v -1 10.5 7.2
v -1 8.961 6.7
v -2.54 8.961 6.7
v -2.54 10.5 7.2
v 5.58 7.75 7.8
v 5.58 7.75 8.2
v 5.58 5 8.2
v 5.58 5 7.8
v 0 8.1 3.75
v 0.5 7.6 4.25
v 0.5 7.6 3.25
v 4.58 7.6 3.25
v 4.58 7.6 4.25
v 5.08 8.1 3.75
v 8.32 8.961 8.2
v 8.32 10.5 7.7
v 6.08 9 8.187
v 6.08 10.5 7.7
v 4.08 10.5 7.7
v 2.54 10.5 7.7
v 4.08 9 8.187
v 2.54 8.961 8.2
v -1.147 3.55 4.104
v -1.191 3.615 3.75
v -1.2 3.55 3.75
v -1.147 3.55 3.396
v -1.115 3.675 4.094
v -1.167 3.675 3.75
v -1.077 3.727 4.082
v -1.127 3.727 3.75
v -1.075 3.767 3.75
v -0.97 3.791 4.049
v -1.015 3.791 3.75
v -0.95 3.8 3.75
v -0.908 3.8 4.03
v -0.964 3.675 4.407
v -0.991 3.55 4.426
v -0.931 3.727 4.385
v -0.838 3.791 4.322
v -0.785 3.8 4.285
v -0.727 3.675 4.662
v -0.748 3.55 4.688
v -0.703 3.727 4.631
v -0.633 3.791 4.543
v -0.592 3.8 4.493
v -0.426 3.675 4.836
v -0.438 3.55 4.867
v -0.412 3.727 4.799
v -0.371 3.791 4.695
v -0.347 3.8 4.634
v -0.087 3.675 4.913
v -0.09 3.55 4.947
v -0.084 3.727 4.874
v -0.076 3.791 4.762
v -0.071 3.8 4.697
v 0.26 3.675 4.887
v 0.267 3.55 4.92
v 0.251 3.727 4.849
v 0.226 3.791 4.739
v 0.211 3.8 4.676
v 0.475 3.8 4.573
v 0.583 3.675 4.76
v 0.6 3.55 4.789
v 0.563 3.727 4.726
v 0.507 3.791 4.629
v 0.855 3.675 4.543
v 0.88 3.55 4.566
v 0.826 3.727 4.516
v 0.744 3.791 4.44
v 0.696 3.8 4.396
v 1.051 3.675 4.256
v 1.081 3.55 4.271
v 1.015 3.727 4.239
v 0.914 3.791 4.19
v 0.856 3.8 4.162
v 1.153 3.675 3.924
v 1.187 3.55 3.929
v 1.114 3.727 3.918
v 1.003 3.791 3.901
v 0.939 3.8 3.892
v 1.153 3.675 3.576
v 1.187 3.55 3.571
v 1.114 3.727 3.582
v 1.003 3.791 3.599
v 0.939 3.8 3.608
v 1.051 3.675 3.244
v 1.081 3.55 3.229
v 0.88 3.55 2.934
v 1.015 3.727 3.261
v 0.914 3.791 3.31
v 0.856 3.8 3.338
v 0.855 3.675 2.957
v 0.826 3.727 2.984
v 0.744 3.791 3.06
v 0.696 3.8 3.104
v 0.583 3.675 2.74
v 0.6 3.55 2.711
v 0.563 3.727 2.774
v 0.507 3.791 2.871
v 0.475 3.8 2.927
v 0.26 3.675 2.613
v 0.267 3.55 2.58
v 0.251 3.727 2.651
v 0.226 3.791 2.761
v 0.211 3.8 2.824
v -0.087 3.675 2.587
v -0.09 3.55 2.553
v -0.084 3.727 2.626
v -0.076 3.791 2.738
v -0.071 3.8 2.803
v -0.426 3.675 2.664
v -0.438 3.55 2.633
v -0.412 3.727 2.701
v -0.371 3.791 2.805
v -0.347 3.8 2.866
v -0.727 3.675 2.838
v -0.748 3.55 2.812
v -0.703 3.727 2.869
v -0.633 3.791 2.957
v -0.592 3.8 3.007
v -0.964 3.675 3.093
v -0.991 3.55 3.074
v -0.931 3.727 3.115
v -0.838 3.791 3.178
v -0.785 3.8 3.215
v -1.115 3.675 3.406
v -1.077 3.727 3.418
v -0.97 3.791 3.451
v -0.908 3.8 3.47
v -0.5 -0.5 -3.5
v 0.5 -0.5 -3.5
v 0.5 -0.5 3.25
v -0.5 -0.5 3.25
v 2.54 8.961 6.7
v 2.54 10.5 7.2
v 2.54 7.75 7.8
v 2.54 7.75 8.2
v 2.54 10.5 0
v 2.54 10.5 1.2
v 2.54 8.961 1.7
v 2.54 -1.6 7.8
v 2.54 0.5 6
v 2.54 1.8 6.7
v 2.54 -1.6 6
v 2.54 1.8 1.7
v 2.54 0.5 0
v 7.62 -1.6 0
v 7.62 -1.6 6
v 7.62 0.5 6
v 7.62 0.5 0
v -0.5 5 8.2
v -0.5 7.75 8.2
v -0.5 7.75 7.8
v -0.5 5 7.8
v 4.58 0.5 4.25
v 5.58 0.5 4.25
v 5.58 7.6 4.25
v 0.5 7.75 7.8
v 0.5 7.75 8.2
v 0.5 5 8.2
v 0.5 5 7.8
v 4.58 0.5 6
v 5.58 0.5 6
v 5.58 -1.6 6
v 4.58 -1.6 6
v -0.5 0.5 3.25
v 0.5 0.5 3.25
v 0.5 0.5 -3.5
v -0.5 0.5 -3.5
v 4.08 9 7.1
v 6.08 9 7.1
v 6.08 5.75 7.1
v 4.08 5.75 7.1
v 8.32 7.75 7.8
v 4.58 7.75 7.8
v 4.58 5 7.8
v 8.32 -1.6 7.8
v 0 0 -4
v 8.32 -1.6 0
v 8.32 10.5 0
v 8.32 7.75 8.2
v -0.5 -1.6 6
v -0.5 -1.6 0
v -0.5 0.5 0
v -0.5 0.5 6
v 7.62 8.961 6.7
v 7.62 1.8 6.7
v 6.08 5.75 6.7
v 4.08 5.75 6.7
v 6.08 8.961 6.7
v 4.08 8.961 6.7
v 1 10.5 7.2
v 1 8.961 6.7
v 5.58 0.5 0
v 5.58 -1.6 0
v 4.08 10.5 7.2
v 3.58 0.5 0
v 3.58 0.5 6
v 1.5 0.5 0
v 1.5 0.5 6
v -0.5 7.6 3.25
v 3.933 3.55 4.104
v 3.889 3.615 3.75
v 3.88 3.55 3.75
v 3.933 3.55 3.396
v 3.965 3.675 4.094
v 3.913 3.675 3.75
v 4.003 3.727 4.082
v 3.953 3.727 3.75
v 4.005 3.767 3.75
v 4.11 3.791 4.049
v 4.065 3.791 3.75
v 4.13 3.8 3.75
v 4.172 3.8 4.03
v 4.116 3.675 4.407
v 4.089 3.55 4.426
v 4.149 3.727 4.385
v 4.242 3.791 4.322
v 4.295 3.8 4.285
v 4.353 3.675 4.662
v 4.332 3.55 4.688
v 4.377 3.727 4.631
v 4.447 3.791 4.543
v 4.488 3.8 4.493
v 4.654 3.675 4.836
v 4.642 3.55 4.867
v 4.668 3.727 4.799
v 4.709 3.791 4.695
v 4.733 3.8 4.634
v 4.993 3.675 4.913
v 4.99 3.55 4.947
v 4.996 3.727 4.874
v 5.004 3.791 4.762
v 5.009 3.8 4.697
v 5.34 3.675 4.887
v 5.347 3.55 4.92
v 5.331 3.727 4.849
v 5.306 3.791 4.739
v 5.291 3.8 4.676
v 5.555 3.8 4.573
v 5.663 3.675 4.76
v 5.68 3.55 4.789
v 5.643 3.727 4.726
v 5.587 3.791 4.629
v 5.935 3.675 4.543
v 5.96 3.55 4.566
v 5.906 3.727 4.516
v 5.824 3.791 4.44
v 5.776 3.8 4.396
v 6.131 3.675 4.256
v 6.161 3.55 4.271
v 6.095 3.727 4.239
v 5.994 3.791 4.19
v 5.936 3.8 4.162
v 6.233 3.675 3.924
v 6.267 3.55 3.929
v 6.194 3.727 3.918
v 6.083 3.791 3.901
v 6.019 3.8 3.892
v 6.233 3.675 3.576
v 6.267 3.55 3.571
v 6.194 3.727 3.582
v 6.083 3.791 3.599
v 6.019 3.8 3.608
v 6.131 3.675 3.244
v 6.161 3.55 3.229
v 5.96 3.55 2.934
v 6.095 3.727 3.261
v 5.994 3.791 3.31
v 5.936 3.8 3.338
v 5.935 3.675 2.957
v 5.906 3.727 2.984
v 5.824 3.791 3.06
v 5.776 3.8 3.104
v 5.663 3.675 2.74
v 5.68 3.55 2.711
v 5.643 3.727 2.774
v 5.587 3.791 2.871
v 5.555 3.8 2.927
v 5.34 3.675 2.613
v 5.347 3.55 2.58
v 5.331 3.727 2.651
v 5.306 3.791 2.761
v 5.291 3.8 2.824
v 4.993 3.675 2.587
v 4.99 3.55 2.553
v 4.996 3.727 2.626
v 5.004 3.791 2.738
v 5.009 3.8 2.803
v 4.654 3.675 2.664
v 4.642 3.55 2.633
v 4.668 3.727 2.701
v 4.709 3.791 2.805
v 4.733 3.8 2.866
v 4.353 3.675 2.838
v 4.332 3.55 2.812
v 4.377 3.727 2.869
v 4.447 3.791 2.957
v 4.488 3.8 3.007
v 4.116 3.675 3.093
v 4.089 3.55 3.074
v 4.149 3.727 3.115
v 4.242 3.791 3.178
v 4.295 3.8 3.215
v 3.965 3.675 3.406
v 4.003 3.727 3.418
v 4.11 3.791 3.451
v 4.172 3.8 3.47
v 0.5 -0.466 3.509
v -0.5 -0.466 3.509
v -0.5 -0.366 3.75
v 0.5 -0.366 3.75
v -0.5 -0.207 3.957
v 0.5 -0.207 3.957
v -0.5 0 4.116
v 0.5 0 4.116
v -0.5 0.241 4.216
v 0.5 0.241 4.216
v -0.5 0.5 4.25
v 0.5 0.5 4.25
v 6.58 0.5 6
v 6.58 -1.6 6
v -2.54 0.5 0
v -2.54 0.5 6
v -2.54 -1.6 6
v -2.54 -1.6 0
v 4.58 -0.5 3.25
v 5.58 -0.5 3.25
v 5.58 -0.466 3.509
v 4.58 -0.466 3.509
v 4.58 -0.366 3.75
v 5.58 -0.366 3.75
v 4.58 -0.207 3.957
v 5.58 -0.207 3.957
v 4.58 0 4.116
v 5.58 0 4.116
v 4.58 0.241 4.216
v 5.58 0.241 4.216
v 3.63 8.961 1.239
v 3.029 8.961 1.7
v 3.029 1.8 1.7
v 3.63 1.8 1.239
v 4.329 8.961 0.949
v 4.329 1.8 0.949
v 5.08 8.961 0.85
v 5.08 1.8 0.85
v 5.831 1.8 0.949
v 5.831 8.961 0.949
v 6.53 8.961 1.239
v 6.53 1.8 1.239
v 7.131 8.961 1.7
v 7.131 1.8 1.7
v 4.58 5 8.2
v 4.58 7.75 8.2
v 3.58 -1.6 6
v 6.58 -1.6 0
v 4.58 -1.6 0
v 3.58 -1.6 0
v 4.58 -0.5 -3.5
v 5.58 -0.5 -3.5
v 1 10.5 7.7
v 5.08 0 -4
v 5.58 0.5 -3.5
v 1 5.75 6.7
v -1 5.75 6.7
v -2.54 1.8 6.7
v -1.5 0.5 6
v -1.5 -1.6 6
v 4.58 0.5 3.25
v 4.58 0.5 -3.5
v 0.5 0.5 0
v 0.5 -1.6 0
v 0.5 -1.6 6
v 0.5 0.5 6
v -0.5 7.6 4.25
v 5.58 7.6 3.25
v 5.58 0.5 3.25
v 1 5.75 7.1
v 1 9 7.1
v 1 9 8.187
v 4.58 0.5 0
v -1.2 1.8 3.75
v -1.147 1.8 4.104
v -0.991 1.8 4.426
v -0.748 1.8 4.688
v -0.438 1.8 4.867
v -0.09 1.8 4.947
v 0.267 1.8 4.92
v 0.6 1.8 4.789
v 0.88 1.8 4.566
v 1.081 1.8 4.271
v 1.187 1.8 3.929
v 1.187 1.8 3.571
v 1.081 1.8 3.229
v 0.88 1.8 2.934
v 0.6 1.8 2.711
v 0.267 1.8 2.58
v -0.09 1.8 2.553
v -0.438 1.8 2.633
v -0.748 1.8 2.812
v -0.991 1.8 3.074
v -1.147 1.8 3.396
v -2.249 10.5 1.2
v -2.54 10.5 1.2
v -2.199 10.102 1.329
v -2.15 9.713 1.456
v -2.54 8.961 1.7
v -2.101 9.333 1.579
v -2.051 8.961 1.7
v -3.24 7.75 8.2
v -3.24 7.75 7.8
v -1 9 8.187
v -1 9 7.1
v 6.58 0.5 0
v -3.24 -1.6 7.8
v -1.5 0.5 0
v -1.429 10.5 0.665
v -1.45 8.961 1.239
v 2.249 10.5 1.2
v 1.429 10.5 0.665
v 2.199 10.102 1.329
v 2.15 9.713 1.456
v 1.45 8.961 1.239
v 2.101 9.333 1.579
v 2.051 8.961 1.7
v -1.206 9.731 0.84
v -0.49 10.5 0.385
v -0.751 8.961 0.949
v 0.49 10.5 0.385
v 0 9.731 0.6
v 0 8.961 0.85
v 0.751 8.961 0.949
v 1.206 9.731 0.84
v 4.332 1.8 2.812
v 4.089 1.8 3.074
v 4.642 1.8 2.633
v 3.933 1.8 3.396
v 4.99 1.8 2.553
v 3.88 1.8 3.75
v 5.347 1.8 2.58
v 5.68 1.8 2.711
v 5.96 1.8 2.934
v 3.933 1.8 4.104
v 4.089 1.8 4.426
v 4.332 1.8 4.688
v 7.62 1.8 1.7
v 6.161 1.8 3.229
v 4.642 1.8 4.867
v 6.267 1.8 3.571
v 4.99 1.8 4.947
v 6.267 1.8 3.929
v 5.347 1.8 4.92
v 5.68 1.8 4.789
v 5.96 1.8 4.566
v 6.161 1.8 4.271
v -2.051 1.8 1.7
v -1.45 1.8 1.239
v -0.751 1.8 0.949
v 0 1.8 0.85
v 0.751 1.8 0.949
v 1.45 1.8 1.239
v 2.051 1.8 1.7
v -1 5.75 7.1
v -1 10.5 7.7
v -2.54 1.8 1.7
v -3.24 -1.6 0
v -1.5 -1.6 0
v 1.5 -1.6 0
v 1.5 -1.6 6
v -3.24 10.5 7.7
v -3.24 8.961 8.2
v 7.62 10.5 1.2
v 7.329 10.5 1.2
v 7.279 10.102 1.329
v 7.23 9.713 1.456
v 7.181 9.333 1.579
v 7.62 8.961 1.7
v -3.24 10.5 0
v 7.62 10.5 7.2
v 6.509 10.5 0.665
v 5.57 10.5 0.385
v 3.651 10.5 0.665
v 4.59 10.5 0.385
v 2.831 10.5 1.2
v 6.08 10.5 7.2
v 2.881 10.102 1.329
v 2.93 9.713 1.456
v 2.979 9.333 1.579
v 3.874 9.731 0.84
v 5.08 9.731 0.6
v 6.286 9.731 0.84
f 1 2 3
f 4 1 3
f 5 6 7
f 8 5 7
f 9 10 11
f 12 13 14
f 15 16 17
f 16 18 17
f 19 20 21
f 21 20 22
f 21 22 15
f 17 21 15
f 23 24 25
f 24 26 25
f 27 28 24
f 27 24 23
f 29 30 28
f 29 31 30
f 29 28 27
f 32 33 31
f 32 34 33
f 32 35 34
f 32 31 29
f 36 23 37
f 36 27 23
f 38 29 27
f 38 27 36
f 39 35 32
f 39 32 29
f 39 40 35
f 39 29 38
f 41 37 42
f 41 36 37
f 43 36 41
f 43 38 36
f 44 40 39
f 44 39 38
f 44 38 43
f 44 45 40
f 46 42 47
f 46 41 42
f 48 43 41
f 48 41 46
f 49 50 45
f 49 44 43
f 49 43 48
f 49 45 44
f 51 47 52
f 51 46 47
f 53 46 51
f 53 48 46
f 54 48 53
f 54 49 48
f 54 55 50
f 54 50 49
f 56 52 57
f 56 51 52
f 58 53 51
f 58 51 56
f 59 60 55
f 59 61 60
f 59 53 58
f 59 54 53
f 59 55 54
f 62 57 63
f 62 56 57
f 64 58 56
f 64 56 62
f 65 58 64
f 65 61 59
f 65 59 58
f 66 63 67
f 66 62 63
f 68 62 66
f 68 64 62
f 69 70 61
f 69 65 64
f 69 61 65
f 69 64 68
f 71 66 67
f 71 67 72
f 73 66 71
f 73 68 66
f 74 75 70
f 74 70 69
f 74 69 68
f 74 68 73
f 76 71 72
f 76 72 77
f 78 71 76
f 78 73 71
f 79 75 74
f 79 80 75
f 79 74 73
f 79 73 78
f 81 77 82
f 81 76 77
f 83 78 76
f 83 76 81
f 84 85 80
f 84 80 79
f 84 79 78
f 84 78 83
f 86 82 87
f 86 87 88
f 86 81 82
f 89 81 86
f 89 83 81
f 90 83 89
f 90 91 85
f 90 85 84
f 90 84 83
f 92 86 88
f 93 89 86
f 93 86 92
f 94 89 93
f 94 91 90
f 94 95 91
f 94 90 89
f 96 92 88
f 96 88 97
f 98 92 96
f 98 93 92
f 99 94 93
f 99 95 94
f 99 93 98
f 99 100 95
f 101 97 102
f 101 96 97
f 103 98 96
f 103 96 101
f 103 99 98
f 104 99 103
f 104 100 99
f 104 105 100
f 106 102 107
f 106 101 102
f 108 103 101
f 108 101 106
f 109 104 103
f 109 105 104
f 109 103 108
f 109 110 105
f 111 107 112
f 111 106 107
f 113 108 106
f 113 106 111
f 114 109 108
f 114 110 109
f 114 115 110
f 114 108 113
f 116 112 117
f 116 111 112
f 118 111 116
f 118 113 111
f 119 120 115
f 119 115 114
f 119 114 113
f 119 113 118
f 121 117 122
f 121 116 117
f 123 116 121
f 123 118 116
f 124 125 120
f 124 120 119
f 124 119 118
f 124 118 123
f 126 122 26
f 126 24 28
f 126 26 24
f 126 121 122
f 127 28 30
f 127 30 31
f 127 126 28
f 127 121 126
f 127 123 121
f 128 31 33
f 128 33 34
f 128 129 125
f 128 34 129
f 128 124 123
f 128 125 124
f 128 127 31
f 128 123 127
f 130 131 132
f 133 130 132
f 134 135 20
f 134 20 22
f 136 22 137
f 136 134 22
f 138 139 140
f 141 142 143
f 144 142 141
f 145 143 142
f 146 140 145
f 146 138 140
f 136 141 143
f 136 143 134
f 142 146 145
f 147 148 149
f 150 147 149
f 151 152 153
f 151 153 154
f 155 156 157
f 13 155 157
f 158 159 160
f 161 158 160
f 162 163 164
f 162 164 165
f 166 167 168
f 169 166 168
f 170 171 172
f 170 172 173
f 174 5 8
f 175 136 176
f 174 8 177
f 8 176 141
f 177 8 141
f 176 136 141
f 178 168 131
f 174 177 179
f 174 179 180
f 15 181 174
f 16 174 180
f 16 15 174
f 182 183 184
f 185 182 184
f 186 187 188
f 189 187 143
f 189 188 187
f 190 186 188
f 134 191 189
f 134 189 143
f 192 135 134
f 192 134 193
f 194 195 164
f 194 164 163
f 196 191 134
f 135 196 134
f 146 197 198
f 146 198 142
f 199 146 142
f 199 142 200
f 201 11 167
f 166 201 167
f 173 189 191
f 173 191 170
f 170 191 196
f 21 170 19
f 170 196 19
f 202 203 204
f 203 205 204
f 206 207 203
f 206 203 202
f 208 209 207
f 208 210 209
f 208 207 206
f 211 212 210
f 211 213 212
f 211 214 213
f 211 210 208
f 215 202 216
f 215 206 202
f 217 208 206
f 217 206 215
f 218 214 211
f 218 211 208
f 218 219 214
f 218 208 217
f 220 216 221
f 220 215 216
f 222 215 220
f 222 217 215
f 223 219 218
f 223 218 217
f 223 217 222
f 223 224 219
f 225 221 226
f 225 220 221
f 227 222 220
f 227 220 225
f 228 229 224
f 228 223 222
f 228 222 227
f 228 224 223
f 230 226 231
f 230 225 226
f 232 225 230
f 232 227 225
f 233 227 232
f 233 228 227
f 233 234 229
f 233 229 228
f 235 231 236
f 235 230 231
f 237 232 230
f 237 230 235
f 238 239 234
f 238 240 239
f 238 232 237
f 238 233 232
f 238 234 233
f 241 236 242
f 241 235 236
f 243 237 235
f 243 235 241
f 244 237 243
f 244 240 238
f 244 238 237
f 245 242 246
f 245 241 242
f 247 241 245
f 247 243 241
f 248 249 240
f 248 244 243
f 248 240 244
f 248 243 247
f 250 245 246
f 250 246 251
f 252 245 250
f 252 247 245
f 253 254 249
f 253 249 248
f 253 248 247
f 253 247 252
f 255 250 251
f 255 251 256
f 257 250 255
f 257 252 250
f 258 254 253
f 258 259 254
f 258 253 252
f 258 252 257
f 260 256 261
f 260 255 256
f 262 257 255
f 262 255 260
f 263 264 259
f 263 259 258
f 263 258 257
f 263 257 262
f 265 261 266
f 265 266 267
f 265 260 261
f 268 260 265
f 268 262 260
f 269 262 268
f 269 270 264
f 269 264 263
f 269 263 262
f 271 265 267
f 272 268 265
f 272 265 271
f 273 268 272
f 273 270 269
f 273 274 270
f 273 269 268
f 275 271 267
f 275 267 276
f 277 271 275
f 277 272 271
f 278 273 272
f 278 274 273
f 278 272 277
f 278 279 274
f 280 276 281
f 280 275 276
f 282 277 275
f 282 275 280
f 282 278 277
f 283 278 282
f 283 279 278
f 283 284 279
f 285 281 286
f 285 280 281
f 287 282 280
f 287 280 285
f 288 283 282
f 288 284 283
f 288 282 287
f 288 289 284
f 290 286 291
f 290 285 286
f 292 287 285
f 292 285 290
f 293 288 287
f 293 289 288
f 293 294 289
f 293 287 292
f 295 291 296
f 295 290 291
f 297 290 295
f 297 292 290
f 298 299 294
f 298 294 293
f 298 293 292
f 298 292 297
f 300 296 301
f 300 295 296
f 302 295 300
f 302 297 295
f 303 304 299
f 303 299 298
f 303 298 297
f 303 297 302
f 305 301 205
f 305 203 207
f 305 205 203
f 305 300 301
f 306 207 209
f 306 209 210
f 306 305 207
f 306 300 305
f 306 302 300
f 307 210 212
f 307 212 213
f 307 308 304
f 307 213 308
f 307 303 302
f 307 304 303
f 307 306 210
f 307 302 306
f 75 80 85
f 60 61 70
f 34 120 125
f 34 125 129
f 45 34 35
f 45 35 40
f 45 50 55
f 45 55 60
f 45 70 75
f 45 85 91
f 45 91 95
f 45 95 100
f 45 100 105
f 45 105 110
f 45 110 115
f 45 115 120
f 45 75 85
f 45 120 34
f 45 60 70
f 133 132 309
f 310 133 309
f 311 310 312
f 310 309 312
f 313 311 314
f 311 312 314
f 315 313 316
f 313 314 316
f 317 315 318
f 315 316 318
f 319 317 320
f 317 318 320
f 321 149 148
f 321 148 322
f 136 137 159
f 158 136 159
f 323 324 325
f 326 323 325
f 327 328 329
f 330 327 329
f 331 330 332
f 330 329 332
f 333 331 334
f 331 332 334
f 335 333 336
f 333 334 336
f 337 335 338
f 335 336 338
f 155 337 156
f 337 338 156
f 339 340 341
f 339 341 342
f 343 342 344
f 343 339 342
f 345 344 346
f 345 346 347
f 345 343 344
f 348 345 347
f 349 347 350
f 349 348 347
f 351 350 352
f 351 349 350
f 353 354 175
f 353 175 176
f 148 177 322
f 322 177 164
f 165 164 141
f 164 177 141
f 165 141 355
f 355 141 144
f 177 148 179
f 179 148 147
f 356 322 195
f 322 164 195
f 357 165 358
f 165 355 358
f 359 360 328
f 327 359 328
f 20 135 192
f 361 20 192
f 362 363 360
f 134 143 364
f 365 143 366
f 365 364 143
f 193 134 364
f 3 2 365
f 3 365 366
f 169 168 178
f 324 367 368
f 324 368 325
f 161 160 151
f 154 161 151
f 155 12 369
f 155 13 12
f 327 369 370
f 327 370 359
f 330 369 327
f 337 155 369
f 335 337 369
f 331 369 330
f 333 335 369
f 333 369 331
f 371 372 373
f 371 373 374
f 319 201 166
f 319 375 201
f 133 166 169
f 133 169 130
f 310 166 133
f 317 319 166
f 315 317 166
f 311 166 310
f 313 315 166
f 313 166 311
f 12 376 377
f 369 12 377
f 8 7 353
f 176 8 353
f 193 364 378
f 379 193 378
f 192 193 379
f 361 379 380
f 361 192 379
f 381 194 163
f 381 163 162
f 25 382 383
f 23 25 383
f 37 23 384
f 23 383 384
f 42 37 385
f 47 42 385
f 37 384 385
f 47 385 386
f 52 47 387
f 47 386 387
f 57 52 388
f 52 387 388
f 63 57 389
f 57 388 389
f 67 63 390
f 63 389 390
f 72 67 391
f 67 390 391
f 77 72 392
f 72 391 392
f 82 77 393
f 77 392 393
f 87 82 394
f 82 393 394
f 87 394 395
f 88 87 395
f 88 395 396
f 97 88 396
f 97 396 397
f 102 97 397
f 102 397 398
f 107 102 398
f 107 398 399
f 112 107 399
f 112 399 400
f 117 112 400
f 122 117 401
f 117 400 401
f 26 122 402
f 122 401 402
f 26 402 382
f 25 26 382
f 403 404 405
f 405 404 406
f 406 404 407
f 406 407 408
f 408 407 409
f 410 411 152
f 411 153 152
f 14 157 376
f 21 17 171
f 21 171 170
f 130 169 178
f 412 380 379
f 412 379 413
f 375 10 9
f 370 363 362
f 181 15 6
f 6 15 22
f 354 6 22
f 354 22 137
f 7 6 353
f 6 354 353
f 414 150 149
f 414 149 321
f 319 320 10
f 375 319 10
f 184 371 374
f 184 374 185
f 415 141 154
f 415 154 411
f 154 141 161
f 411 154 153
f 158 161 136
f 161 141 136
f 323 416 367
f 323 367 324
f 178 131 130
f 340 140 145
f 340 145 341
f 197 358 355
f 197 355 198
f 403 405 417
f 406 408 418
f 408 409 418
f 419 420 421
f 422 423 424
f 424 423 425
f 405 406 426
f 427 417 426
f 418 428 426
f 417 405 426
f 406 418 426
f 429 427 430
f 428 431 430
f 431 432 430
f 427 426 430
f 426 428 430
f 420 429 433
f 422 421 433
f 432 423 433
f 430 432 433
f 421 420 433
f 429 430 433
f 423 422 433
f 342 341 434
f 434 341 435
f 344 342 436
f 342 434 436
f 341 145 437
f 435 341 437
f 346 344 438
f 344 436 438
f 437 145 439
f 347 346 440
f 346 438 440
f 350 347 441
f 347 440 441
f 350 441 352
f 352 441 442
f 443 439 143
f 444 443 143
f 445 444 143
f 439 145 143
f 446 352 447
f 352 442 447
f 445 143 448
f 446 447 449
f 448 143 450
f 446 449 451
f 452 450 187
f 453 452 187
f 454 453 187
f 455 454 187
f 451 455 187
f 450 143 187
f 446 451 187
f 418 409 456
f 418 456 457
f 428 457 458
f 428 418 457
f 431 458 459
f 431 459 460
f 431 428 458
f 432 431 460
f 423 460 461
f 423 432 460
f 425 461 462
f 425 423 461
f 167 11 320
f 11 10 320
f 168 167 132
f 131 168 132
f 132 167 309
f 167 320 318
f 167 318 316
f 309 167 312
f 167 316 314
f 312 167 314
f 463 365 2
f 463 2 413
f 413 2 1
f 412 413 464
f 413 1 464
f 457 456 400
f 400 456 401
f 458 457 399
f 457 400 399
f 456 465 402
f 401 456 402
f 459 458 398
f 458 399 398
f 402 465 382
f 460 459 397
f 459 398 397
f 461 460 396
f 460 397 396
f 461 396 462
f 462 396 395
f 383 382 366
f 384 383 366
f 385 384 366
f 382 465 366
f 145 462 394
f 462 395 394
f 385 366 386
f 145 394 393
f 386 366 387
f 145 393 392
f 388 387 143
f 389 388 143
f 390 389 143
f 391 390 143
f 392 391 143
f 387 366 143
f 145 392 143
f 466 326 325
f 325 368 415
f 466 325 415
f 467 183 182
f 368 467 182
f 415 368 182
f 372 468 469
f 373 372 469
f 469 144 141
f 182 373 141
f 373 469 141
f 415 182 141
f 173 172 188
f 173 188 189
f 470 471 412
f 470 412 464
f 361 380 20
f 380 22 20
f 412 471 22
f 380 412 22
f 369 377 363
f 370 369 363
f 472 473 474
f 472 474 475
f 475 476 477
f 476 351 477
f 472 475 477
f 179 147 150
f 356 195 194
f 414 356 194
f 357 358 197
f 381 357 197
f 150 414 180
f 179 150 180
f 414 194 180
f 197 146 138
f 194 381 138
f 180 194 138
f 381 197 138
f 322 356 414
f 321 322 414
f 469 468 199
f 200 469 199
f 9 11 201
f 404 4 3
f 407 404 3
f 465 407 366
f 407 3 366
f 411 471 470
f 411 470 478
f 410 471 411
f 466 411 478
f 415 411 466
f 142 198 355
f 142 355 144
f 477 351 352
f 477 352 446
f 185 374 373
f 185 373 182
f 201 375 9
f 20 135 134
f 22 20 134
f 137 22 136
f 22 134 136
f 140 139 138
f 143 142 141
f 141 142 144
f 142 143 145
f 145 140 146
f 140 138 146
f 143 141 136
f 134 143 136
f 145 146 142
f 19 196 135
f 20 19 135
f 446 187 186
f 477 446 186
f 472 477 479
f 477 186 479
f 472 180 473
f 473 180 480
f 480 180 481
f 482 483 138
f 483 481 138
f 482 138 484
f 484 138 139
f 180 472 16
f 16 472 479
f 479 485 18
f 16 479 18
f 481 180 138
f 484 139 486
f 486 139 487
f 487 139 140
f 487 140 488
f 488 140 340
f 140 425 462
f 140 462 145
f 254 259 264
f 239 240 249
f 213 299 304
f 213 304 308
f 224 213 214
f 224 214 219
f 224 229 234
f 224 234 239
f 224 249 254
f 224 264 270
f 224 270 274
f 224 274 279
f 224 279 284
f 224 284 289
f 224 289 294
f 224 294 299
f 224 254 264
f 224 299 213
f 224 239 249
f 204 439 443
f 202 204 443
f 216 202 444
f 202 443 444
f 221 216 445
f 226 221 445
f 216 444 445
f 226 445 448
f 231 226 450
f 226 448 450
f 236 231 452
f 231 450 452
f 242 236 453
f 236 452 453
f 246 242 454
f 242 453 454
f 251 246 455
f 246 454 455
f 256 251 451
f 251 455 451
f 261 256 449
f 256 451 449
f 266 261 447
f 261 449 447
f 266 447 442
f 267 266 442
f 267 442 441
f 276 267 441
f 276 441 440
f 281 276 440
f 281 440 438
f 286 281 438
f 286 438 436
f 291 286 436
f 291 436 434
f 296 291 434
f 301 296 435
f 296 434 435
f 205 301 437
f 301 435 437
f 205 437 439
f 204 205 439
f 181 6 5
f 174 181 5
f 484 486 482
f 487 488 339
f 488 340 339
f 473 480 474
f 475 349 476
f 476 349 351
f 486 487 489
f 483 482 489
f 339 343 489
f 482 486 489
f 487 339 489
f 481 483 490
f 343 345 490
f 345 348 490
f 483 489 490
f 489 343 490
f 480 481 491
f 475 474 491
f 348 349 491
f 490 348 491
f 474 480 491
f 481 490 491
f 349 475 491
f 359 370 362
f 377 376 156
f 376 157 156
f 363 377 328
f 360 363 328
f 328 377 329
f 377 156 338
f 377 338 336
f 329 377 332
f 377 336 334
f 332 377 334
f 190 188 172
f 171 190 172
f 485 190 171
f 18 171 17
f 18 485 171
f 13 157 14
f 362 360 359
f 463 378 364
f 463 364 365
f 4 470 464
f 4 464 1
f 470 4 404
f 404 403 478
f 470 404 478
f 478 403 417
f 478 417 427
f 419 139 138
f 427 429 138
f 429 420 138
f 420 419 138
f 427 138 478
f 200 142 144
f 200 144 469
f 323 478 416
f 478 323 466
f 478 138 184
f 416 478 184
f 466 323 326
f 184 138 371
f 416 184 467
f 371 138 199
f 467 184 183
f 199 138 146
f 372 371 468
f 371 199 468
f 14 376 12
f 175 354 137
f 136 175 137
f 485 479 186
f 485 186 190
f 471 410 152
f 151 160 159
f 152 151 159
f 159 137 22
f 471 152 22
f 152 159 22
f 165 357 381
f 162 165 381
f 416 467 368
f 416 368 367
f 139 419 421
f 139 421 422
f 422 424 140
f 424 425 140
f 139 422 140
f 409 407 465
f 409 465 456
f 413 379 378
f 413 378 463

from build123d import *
from OCP.BRepFilletAPI import BRepFilletAPI_MakeChamfer

# Parameters (mm, degrees)
SKETCH_1_W             = 5.08
SKETCH_1_H             = 12.1
EXTRUDE_1_DEPTH        = 8.2
CUT_EXTRUDE_1_DEPTH    = 8.7
SKETCH_3_R             = 1.2
EXTRUDE_2_DEPTH        = 2
FILLET_1_R             = 0.25
CHAMFER_1_SIZE         = 0.5
CHAMFER_1_SIZE2        = 1.538841769
SKETCH_4_W             = 2
SKETCH_4_H             = 1.010953213
CUT_EXTRUDE_2_DEPTH    = 4.75
SKETCH_5_W             = 2
SKETCH_5_H             = 1.705458635
CUT_EXTRUDE_3_DEPTH    = 1.5
CHAMFER_2_SIZE         = 0.5
CHAMFER_2_SIZE2        = 1.538841769
SKETCH_6_W             = 5.08
SKETCH_6_H             = 6.6
CUT_EXTRUDE_4_DEPTH    = 0.4
SKETCH_7_W             = 2.04
SKETCH_7_H             = 2.75
CUT_EXTRUDE_5_DEPTH    = 0.4
EXTRUDE_1_2_DEPTH      = 0.5
EXTRUDE_1_2_DEPTH_BACK = 0.5
CHAMFER_3_SIZE         = 0.5
SKETCH_9_W             = 1
SKETCH_9_H             = 2.1
SKETCH_9_W_2           = 1.04
CUT_EXTRUDE_6_DEPTH    = 6
PATTERN_LINEAR_1_COUNT = 2
PATTERN_LINEAR_1_PITCH = 5.08
EXTRUDE_3_DEPTH        = 0.7
EXTRUDE_4_DEPTH        = 0.7
MOVE_BODY_1_ANGLE      = 180


with BuildPart() as part:
    # Эскиз1 → Extrude 1 (new body)
    with BuildSketch(Plane(origin=(0, 0, 0), x_dir=(1, 0, 0), z_dir=(0, 1, 0))):
        Rectangle(SKETCH_1_W, SKETCH_1_H)
    extrude(amount=EXTRUDE_1_DEPTH)

    # Эскиз2 → Вырез-Вытянуть1 (cut)
    with BuildSketch(Plane.XY.offset(6.05)):
        with BuildLine():
            Line((-2.54, 6.7), (2.54, 6.7))
            Line((2.54, 6.7), (2.54, 1.7))
            Line((2.54, 1.7), (2.05121915, 1.7))
            ThreePointArc((2.05121915, 1.7), (0, 0.85), (-2.05121915, 1.7))
            Line((-2.05121915, 1.7), (-2.54, 1.7))
            Line((-2.54, 1.7), (-2.54, 6.7))
        make_face()
    extrude(amount=-CUT_EXTRUDE_1_DEPTH, mode=Mode.SUBTRACT)

    # Эскиз3 → Бобышка-Вытянуть2 (add)
    with BuildSketch(Plane.XY.offset(-2.65)):
        with Locations((0, 3.75)):
            Circle(SKETCH_3_R)
    extrude(amount=EXTRUDE_2_DEPTH)

    # Скругление1
    fillet_1_edges = [part.edges().sort_by_distance(p)[0] for p in [
        (-1.2, 3.75, -0.65),
    ]]
    fillet(fillet_1_edges, radius=FILLET_1_R)

    # Фаска1: one chamfer whose edges measure the first distance from different faces: ONE call of the kernel's chamfer builder (chamfer() names one face for all edges)
    chamfer_1_edges_1 = [part.edges().sort_by_distance(p)[0] for p in [
        (0, 6.7, 6.05),
    ]]
    chamfer_1_side_1 = [part.faces().sort_by_distance(p)[0] for p in [
        (0, 7.45, 6.05),
    ]]
    chamfer_1_edges_2 = [part.edges().sort_by_distance(p)[0] for p in [
        (2.295609575, 1.7, 6.05),
        (-2.295609575, 1.7, 6.05),
        (0, 0.85, 6.05),
    ]]
    chamfer_1_side_2 = [part.faces().sort_by_distance(p)[0] for p in [
        (0, 0.655214235, 6.05),
    ]]
    chamfer_1 = BRepFilletAPI_MakeChamfer(part.part.solid().wrapped)
    for e in chamfer_1_edges_1:
        chamfer_1.Add(CHAMFER_1_SIZE, CHAMFER_1_SIZE2, e.wrapped, chamfer_1_side_1[0].wrapped)  # the first distance lies on this face
    for e in chamfer_1_edges_2:
        chamfer_1.Add(CHAMFER_1_SIZE, CHAMFER_1_SIZE2, e.wrapped, chamfer_1_side_2[0].wrapped)  # the first distance lies on this face
    add(Compound.cast(chamfer_1.Shape()), mode=Mode.REPLACE)

    # Эскиз4 → Вырез-Вытянуть2 (cut)
    with BuildSketch(Plane.XY.offset(6.05)):
        with Locations((0, 6.594523394)):
            Rectangle(SKETCH_4_W, SKETCH_4_H)
    extrude(amount=-CUT_EXTRUDE_2_DEPTH, mode=Mode.SUBTRACT)

    # Эскиз5 → Вырез-Вытянуть3 (cut)
    with BuildSketch(Plane.XY.offset(6.05)):
        with Locations((0, 7.552729318)):
            Rectangle(SKETCH_5_W, SKETCH_5_H)
    extrude(amount=-CUT_EXTRUDE_3_DEPTH, mode=Mode.SUBTRACT)

    # Фаска2
    chamfer_2_edges = [part.edges().sort_by_distance(p)[0] for p in [
        (-1.77, 8.2, 6.05),
    ]]
    chamfer_2_side = [part.faces().sort_by_distance(p)[0] for p in [
        (-1.77, 7.7, 6.05),
    ]]
    chamfer(chamfer_2_edges, length=CHAMFER_2_SIZE, length2=CHAMFER_2_SIZE2, reference=chamfer_2_side[0])

    # Эскиз6 → Вырез-Вытянуть4 (cut)
    with BuildSketch(Plane(origin=(0, 8.2, 0), x_dir=(1, 0, 0), z_dir=(0, 1, 0))):
        with Locations((0, 2.75)):
            Rectangle(SKETCH_6_W, SKETCH_6_H)
    extrude(amount=-CUT_EXTRUDE_4_DEPTH, mode=Mode.SUBTRACT)

    # Эскиз7 → Вырез-Вытянуть5 (cut)
    with BuildSketch(Plane(origin=(0, 8.2, 0), x_dir=(1, 0, 0), z_dir=(0, 1, 0))):
        with Locations((1.52, -1.925)):
            Rectangle(SKETCH_7_W, SKETCH_7_H)
        with Locations((-1.52, -1.925)):
            Rectangle(SKETCH_7_W, SKETCH_7_H)
    extrude(amount=-CUT_EXTRUDE_5_DEPTH, mode=Mode.SUBTRACT)

    # Эскиз9 → Вырез-Вытянуть6 (cut)
    with BuildSketch(Plane.XZ):
        with Locations((0, -5)):
            Rectangle(SKETCH_9_W, SKETCH_9_H)
        with Locations((-2.02, -5)):
            Rectangle(SKETCH_9_W_2, SKETCH_9_H)
        with Locations((2.02, -5)):
            Rectangle(SKETCH_9_W_2, SKETCH_9_H)
    extrude(amount=-CUT_EXTRUDE_6_DEPTH, mode=Mode.SUBTRACT)


with BuildPart() as body_2:
    # Эскиз8 → Extrude 1 2 (new, two sides: drawn at the far end of the back side and taken through both)
    with BuildSketch(Plane(origin=(0, 0, 0), x_dir=(0, 0, -1), z_dir=(1, 0, 0)).offset(-EXTRUDE_1_2_DEPTH_BACK)):
        with BuildLine():
            Line((-3.65, 3.25), (3.95, 3.25))
            Line((3.95, 3.25), (3.95, -4))
            Line((3.95, -4), (4.95, -4))
            Line((4.95, -4), (4.95, 3.25))
            ThreePointArc((4.95, 3.25), (4.657106781, 3.957106781), (3.95, 4.25))
            Line((3.95, 4.25), (-3.65, 4.25))
            Line((-3.65, 4.25), (-3.65, 3.25))
        make_face()
    extrude(amount=EXTRUDE_1_2_DEPTH + EXTRUDE_1_2_DEPTH_BACK)

    # Фаска3
    chamfer_3_edges = [body_2.edges().sort_by_distance(p)[0] for p in [
        (0, 3.25, 3.65),
        (0, 4.25, 3.65),
        (0, -4, -4.95),
        (0, -4, -3.95),
        (0.5, -4, -4.45),
        (0.5, 3.75, 3.65),
        (-0.5, 3.75, 3.65),
        (-0.5, -4, -4.45),
    ]]
    chamfer(chamfer_3_edges, length=CHAMFER_3_SIZE - 0.0001)  # a hair under: the kernel refuses the full size


with BuildPart() as pattern_linear_1_1:
    # Линейный массив1: pattern copy
    add(body_2.part.moved(Location(Vector(-1, 0, 0) * (1 * PATTERN_LINEAR_1_PITCH))))


with BuildPart() as pattern_linear_1_2:
    # Линейный массив1: pattern copy
    add(part.part.moved(Location(Vector(-1, 0, 0) * (1 * PATTERN_LINEAR_1_PITCH))))

    # Эскиз11 → Бобышка-Вытянуть4 (add)
    with BuildSketch(Plane.ZY.offset(7.62)):
        Polygon((-6.05, 7.8), (-6.05, 0), (6.05, 0), (6.05, 7.7), (4.511158231, 8.2), (3.3, 8.2), (3.3, 7.8), align=None)
    extrude(amount=EXTRUDE_4_DEPTH)


with BuildPart() as part_1:
    add(part.part)

    # Эскиз10 → Бобышка-Вытянуть3 (add)
    with BuildSketch(Plane(origin=(2.54, 0, 0), x_dir=(0, 0, -1), z_dir=(1, 0, 0))):
        Polygon((6.05, 7.8), (-3.3, 7.8), (-3.3, 8.2), (-4.511158231, 8.2), (-6.05, 7.7), (-6.05, 0), (6.05, 0), align=None)
    extrude(amount=EXTRUDE_3_DEPTH)


with BuildPart() as body_2_1:
    # Move Body 1: moved
    add(body_2.part.rotate(Axis((0, 0, 0), (0, 0.7071067811865488, 0.7071067811865462)), MOVE_BODY_1_ANGLE))


with BuildPart() as pattern_linear_1_1_1:
    # Move Body 1: moved
    add(pattern_linear_1_1.part.rotate(Axis((0, 0, 0), (0, 0.7071067811865488, 0.7071067811865462)), MOVE_BODY_1_ANGLE))


with BuildPart() as part_2:
    # Move Body 1: moved
    add(part_1.part.rotate(Axis((0, 0, 0), (0, 0.7071067811865488, 0.7071067811865462)), MOVE_BODY_1_ANGLE))


with BuildPart() as pattern_linear_1_2_1:
    # Move Body 1: moved
    add(pattern_linear_1_2.part.rotate(Axis((0, 0, 0), (0, 0.7071067811865488, 0.7071067811865462)), MOVE_BODY_1_ANGLE))


with BuildPart() as pattern_linear_1_2_2:
    # Move Body 2: read off the stored shape, not the designer's step
    # Move Body 2: moved
    add(pattern_linear_1_2_1.part.moved(Location((0, 4.45, 0))))


with BuildPart() as part_3:
    # Move Body 2 2: moved
    add(part_2.part.moved(Location((0, 4.45, 0))))


with BuildPart() as pattern_linear_1_1_2:
    # Move Body 2 3: moved
    add(pattern_linear_1_1_1.part.moved(Location((0, 4.45, 0))))


with BuildPart() as body_2_2:
    # Move Body 2 4: moved
    add(body_2_1.part.moved(Location((0, 4.45, 0))))


solid = Compound([pattern_linear_1_2_2.part, part_3.part, pattern_linear_1_1_2.part, body_2_2.part])
